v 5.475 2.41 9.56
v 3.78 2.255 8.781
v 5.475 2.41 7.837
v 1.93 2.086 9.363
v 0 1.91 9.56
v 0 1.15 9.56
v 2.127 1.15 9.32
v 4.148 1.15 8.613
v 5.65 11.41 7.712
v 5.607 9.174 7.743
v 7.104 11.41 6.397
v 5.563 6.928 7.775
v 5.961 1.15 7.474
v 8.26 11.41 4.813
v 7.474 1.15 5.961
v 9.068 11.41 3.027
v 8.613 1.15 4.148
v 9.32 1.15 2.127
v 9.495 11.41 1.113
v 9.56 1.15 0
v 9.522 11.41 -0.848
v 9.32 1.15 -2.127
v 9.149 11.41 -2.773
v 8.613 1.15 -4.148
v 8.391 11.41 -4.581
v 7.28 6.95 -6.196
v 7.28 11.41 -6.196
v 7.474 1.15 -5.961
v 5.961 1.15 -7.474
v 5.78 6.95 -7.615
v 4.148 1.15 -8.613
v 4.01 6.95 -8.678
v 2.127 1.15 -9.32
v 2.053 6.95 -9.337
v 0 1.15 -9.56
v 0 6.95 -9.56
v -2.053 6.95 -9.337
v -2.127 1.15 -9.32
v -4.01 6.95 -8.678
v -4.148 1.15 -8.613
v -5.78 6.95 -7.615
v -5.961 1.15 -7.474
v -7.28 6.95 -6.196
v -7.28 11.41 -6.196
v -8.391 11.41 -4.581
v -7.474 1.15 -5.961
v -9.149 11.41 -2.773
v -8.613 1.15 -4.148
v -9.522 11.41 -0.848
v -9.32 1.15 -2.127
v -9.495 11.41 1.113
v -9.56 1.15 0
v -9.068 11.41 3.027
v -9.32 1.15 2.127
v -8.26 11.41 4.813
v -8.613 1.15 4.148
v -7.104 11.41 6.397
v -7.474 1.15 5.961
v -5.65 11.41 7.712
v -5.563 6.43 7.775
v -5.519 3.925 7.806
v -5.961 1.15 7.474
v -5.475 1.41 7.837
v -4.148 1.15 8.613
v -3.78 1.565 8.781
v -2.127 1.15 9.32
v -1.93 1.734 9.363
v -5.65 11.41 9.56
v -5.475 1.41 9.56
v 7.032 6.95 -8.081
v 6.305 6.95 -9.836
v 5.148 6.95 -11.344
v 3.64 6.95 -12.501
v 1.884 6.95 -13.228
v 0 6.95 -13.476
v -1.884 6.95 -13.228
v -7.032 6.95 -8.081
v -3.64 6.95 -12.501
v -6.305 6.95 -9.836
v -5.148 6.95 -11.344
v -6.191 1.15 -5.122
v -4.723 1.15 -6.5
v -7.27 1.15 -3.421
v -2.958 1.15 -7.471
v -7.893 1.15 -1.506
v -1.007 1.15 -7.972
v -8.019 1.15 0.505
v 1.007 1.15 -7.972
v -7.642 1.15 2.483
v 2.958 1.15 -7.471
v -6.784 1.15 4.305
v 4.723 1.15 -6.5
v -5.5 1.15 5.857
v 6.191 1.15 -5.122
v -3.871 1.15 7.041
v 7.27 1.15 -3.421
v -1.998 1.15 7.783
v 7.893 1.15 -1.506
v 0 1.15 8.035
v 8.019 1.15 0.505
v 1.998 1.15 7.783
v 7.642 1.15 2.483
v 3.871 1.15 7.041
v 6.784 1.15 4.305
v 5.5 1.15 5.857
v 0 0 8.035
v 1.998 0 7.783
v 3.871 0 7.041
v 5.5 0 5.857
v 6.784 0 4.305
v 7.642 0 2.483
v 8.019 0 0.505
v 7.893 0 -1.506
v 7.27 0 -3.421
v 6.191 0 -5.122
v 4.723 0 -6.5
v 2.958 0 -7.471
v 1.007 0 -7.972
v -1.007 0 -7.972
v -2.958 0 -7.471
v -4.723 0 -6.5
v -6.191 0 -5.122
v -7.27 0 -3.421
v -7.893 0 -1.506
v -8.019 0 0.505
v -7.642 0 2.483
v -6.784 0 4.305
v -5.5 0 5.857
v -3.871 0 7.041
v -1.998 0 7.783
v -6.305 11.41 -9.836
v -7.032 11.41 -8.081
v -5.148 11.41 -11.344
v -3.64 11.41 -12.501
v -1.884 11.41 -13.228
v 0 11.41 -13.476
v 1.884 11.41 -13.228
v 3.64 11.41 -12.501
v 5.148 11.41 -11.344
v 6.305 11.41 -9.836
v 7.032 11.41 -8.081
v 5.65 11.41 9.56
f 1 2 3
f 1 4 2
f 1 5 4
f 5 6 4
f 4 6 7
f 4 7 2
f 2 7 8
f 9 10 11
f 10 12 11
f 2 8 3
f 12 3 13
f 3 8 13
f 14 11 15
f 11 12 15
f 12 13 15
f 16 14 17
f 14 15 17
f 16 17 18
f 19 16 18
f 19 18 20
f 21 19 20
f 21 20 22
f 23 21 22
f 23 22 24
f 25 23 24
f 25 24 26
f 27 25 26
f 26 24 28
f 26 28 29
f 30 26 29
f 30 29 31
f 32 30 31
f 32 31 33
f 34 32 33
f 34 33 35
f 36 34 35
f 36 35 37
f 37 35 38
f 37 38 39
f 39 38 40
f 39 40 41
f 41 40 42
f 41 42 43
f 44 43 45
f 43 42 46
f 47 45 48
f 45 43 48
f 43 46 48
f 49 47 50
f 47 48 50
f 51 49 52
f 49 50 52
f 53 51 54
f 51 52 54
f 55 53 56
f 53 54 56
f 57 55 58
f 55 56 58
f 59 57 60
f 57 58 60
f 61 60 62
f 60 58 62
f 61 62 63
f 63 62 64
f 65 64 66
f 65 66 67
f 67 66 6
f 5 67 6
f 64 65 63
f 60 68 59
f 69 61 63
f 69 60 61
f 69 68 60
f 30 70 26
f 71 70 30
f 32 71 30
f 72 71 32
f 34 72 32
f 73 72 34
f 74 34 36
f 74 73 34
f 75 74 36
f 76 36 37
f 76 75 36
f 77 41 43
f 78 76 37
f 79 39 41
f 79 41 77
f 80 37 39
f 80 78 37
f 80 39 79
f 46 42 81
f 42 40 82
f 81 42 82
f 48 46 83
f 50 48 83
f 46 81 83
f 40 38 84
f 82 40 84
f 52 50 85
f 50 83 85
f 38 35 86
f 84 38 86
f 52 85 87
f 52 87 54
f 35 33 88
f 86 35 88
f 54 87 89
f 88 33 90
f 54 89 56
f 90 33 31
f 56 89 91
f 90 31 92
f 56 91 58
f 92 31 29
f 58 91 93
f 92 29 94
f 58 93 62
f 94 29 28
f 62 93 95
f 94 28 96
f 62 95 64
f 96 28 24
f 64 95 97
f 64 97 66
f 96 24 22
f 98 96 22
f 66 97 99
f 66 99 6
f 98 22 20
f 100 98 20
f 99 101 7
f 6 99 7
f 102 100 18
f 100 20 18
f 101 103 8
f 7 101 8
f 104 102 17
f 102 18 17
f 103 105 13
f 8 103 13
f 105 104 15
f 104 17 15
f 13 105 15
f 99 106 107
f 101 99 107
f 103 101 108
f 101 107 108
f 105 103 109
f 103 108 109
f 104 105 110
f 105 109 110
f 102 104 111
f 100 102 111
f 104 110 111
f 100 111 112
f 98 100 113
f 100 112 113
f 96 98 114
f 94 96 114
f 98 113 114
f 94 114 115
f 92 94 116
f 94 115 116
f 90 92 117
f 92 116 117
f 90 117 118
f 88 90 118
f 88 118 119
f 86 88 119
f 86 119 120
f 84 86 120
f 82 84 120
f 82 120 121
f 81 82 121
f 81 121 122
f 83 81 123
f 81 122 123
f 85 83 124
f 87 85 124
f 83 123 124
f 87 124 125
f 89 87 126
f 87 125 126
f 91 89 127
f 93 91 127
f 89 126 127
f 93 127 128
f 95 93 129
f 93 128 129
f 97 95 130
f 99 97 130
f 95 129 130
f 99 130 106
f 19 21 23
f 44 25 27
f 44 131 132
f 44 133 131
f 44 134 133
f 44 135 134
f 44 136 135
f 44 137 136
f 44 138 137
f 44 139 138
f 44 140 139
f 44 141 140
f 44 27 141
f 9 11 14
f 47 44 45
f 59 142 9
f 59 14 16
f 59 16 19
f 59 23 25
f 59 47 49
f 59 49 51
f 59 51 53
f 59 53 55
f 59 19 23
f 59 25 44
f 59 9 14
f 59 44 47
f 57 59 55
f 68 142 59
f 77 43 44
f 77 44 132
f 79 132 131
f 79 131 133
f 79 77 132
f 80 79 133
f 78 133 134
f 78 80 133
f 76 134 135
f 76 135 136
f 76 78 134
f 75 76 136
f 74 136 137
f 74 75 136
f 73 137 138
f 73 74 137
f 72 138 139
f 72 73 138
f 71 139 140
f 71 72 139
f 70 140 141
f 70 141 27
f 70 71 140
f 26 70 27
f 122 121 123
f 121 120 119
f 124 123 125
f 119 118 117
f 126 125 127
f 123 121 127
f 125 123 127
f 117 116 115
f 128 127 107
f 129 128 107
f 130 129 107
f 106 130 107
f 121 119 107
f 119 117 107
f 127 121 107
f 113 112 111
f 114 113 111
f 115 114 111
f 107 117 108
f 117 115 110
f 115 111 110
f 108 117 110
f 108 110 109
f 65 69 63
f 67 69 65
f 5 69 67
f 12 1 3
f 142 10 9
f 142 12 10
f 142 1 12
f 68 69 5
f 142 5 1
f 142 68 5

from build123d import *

# Parameters (mm, degrees)
CROQUIS1_R              = 8.035
SALIENTE_EXTRUIR1_DEPTH = 1.15
CROQUIS2_R              = 9.56
SALIENTE_EXTRUIR2_DEPTH = 10.26
SALIENTE_EXTRUIR3_START = -4.46
SALIENTE_EXTRUIR3_DEPTH = 4.46
SALIENTE_EXTRUIR4_DEPTH = 4.46


with BuildPart() as part:
    # Croquis1 → Saliente-Extruir1 (new body)
    with BuildSketch(Plane(origin=(0, 0, 0), x_dir=(1, 0, 0), z_dir=(0, 1, 0))):
        with Locations(Location((0, 0, 0), (0, 0, 270))):
            Circle(CROQUIS1_R)
    extrude(amount=SALIENTE_EXTRUIR1_DEPTH)

    # Croquis2 → Saliente-Extruir2 (add)
    with BuildSketch(Plane(origin=(0, 1.15, 0), x_dir=(1, 0, 0), z_dir=(0, 1, 0))):
        with Locations(Location((0, 0, 0), (0, 0, 270))):
            Circle(CROQUIS2_R)
    extrude(amount=SALIENTE_EXTRUIR2_DEPTH)

    # Croquis3 → Saliente-Extruir3 (add)
    with BuildSketch(Plane(origin=(0, 11.41, 0), x_dir=(1, 0, 0), z_dir=(0, 1, 0)).offset(SALIENTE_EXTRUIR3_START)):
        with BuildLine():
            ThreePointArc((-7.280024761, 6.196356953), (0, 13.476381713), (7.280024761, 6.196356953))
            ThreePointArc((7.280024761, 6.196356953), (0, -9.56), (-7.280024761, 6.196356953))
        make_face()
    extrude(amount=SALIENTE_EXTRUIR3_DEPTH)

    # Croquis6 → Saliente-Extruir4 (add)
    with BuildSketch(Plane.XY.offset(9.56)):
        Polygon((-5.475, 1.41), (5.475, 2.41), (5.65, 11.41), (-5.65, 11.41), align=None)
    extrude(amount=-SALIENTE_EXTRUIR4_DEPTH)


solid = part.part
